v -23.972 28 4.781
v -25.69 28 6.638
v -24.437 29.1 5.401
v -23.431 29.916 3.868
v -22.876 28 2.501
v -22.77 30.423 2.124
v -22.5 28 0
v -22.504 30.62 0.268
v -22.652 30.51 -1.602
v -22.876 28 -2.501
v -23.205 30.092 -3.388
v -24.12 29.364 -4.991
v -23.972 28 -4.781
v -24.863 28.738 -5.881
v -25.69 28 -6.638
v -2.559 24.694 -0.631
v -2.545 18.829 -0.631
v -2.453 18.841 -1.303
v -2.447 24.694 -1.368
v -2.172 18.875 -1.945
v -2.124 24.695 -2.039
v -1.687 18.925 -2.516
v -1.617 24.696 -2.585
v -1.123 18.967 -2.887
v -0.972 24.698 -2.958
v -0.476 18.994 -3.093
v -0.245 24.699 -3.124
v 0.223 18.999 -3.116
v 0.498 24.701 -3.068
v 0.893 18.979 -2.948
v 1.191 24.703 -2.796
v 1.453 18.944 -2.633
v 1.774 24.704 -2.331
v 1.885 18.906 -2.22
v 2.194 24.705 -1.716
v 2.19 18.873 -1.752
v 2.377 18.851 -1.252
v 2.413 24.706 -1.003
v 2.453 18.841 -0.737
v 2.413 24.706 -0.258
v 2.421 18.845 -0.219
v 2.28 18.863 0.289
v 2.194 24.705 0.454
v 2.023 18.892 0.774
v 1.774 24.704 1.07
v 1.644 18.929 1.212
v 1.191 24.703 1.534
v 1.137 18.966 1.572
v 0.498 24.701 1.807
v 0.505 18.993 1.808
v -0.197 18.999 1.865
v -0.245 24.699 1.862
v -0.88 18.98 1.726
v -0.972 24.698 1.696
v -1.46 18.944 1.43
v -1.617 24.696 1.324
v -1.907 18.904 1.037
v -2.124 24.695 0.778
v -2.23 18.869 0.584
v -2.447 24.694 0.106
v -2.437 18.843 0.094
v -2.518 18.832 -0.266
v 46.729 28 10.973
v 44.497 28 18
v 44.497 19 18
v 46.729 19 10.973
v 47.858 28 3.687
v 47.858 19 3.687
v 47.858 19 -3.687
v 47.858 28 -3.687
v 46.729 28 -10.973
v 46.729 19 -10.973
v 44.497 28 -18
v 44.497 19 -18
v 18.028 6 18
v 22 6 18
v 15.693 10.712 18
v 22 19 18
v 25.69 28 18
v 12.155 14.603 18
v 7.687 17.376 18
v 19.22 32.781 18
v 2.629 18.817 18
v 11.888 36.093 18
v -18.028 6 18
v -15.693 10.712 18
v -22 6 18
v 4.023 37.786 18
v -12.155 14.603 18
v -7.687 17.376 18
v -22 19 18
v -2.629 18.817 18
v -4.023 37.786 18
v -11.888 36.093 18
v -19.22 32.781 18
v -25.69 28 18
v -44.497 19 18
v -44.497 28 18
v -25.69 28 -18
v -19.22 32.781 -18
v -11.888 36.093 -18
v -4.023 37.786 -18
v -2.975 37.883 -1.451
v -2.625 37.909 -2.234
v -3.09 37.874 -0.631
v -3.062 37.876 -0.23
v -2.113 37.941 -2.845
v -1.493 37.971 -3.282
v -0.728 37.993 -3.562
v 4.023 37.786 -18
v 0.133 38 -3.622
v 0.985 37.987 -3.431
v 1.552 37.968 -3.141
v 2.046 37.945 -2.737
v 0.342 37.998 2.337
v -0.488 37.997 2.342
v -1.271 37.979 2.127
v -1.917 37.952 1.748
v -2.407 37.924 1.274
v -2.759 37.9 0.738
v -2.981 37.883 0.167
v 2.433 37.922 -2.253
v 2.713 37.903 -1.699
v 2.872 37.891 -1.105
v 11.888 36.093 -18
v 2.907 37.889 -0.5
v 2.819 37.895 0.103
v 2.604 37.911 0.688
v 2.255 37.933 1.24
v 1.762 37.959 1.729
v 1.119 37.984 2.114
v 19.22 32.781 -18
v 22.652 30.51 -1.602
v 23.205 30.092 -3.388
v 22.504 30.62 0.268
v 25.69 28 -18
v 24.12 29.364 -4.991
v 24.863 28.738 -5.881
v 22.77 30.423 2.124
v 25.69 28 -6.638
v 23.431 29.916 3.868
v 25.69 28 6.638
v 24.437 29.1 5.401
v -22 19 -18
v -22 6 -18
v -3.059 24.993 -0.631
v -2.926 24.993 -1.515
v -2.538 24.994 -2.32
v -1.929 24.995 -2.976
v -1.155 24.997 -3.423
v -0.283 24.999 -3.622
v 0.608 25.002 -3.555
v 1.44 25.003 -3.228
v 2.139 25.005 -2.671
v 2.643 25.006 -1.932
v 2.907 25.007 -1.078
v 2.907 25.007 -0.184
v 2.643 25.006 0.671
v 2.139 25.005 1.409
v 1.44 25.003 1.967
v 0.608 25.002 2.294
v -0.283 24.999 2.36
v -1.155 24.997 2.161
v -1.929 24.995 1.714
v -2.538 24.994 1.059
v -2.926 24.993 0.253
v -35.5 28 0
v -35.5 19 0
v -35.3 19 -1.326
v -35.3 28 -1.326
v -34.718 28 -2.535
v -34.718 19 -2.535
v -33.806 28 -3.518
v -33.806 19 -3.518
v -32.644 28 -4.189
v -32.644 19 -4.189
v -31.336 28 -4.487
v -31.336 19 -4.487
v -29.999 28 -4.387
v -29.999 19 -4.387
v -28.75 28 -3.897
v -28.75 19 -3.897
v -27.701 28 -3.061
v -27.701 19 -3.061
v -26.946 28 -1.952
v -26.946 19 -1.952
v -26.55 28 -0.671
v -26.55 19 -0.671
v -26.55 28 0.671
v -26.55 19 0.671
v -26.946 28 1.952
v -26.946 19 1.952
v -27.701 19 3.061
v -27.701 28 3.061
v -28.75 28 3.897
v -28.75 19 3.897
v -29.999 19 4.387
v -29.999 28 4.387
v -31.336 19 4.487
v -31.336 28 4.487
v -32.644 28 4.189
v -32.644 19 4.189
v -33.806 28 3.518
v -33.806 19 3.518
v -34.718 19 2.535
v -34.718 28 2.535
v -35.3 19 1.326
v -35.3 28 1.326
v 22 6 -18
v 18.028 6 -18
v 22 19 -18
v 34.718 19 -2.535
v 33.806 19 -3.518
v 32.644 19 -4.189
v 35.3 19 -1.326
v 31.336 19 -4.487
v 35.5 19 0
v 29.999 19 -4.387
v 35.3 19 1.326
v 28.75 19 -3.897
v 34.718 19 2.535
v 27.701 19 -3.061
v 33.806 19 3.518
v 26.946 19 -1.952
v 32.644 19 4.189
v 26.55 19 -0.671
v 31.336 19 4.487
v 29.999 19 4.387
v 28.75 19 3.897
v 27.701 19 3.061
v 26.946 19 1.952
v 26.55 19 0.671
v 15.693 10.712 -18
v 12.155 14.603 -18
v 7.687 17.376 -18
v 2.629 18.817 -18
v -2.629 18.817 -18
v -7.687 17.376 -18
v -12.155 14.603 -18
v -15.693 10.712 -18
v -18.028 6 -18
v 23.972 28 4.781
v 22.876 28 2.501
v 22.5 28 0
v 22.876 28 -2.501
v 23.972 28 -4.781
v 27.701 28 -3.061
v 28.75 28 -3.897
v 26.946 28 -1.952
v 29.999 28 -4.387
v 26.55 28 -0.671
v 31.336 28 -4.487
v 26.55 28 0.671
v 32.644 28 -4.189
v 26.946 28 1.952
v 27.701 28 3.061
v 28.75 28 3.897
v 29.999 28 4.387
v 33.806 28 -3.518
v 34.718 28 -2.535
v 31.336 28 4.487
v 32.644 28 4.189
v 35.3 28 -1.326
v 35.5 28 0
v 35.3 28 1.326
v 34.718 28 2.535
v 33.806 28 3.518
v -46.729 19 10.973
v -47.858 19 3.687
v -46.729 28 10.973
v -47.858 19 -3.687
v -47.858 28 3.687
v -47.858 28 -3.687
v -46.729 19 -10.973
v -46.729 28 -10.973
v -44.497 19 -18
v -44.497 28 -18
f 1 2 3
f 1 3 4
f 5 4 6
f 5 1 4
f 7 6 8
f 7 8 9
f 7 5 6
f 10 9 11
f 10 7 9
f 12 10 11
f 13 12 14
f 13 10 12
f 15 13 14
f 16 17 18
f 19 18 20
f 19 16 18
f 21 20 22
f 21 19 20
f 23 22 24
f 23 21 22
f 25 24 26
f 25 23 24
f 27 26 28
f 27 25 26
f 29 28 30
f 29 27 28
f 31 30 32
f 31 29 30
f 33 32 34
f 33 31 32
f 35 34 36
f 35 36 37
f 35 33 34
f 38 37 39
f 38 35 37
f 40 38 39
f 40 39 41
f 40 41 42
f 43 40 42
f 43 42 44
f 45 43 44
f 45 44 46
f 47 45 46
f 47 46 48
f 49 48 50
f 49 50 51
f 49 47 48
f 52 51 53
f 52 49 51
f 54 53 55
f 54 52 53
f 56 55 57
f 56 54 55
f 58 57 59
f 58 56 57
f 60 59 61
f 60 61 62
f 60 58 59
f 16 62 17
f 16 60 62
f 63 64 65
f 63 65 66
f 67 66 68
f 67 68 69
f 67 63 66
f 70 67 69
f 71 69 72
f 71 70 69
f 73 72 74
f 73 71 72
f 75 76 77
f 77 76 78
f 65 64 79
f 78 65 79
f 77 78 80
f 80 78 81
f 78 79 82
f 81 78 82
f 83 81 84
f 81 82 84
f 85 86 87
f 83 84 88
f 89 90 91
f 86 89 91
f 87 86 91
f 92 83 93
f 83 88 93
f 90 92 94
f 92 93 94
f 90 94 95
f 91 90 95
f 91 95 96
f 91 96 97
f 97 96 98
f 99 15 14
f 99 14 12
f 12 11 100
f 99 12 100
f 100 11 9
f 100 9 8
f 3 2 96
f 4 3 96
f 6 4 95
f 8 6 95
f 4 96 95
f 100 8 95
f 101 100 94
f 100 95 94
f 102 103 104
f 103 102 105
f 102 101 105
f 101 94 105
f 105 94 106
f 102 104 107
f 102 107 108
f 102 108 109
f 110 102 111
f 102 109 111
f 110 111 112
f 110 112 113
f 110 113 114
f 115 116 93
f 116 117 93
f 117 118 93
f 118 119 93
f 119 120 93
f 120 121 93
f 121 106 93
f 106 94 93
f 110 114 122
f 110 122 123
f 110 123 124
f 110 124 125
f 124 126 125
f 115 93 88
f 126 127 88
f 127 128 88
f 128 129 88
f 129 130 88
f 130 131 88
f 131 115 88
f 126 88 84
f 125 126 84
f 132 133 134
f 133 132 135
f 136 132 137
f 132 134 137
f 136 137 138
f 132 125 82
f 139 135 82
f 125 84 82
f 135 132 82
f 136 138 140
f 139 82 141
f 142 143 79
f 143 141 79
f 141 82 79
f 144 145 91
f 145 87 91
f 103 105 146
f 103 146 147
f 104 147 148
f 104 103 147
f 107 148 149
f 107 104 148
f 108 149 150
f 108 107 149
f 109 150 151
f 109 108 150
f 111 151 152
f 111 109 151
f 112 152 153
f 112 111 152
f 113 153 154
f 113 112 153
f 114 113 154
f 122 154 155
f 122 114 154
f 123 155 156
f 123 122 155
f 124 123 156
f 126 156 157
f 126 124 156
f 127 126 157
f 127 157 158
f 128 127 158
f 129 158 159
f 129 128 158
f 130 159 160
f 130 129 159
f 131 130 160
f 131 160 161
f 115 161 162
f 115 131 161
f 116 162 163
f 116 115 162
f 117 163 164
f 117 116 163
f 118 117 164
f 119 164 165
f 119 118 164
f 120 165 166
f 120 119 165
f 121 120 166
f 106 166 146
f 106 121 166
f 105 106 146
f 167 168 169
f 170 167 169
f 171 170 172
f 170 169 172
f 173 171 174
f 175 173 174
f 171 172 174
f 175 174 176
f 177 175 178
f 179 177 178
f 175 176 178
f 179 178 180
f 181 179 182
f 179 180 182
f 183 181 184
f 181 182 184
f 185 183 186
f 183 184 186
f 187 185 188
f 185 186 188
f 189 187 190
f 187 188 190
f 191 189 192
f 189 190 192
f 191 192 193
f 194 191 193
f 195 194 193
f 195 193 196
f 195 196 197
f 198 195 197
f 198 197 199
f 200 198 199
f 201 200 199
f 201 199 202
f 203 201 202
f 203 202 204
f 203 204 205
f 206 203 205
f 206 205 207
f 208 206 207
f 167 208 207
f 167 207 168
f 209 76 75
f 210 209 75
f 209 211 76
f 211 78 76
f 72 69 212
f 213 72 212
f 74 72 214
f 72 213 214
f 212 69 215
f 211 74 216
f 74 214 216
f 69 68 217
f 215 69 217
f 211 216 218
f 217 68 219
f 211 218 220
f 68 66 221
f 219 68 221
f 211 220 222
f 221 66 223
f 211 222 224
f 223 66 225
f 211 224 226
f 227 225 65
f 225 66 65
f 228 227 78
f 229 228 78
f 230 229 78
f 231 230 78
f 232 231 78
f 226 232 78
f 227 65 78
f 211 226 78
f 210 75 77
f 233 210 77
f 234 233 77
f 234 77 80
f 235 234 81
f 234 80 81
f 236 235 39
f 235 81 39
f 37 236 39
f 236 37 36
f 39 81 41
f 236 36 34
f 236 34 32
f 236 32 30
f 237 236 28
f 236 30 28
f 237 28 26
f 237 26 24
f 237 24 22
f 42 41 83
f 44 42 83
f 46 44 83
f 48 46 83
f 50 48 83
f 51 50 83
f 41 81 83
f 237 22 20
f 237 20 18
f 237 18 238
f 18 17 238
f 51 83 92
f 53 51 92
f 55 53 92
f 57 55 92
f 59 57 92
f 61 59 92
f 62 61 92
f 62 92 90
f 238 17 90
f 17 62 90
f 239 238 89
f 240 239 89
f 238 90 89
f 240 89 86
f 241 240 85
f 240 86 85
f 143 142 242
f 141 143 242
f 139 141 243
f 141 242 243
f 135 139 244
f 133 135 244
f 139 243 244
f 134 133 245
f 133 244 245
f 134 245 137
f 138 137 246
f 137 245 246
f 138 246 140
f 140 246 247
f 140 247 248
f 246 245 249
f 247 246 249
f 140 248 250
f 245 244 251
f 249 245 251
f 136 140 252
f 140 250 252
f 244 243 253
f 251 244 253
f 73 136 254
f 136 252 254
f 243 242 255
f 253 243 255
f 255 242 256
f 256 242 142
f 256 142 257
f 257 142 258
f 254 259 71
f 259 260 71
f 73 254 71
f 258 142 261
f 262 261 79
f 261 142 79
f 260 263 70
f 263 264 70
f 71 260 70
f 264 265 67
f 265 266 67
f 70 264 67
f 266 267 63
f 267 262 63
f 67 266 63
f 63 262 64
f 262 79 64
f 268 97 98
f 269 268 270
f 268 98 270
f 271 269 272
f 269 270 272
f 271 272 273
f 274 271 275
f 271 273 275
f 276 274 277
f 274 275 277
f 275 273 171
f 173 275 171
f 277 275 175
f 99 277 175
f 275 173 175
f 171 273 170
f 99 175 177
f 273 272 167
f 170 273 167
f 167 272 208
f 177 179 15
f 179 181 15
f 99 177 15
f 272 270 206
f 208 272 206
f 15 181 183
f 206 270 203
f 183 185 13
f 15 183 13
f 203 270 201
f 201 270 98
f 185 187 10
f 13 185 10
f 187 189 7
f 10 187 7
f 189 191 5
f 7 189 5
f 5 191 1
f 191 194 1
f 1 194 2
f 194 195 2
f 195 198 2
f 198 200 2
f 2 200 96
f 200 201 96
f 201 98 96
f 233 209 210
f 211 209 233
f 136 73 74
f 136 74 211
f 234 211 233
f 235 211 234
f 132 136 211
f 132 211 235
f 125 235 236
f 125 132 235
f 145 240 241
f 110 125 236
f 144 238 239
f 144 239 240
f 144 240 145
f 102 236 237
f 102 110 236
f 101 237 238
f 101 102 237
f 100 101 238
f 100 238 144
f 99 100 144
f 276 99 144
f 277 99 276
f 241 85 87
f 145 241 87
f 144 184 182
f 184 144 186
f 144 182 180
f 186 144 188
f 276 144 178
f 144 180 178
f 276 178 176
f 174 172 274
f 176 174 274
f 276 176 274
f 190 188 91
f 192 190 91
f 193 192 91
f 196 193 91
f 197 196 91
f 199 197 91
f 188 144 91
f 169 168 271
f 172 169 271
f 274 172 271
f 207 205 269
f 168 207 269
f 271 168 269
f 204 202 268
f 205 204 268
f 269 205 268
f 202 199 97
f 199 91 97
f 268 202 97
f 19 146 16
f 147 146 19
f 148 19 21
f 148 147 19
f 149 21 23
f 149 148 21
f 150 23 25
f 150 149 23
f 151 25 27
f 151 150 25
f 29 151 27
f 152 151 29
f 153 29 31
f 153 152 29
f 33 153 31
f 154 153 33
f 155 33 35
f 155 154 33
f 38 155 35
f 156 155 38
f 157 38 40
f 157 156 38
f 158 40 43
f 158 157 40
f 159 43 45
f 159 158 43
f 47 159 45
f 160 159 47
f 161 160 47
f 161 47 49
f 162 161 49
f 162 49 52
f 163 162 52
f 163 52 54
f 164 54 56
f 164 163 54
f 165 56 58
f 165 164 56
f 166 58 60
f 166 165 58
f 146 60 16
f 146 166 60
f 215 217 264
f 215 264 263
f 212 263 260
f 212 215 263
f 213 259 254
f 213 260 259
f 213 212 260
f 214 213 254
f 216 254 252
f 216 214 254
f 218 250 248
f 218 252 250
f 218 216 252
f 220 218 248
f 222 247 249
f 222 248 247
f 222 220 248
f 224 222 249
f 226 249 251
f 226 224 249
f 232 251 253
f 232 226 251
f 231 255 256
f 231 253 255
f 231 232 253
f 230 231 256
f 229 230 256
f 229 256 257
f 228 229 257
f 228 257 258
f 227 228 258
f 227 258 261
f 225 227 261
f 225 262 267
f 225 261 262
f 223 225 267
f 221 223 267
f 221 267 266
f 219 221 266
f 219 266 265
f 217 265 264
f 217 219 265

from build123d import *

# Parameters (mm, degrees)
BOSS_EXTRUDE1_DEPTH   = 18
F_8_0MM_DOWEL_HOLE1_D = 9
CUT_EXTRUDE3_DEPTH    = 35
CUT_EXTRUDE4_DEPTH    = 3


with BuildPart() as part:
    # Sketch1 → Boss-Extrude1 (new body, symmetric)
    with BuildSketch(Plane.XY):
        with BuildLine():
            Line((-18.027756377, 6), (-22, 6))
            Line((-22, 6), (-22, 19))
            Line((-22, 19), (-50, 19))
            Line((-50, 19), (-50, 28))
            Line((-50, 28), (-25.690465157, 28))
            ThreePointArc((-25.690465157, 28), (0, 38), (25.690465157, 28))
            Line((25.690465157, 28), (50, 28))
            Line((50, 28), (50, 19))
            Line((50, 19), (22, 19))
            Line((22, 19), (22, 6))
            Line((22, 6), (18.027756377, 6))
            ThreePointArc((18.027756377, 6), (0, 19), (-18.027756377, 6))
        make_face()
    extrude(amount=BOSS_EXTRUDE1_DEPTH, both=True)

    # Ø8.0mm Dowel Hole1 (through all)
    with Locations(Plane(origin=(0, 28, 0), x_dir=(1, 0, 0), z_dir=(0, 1, 0))):
        with Locations((-31, 0)):
            f_8_0mm_dowel_hole1 = Hole(F_8_0MM_DOWEL_HOLE1_D / 2)

    # Sketch6 → Cut-Extrude3 (cut)
    with BuildSketch(Plane(origin=(0, 28, 0), x_dir=(1, 0, 0), z_dir=(0, 1, 0))):
        with BuildLine():
            Line((-44.497190923, 18), (-50, 18))
            Line((-50, 18), (-50, -18))
            Line((-50, -18), (-44.497190923, -18))
            ThreePointArc((-44.497190923, -18), (-48, 0), (-44.497190923, 18))
        make_face()
        with BuildLine():
            Line((44.497190923, 18), (50, 18))
            Line((50, 18), (50, -18))
            Line((50, -18), (44.497190923, -18))
            ThreePointArc((44.497190923, -18), (48, 0), (44.497190923, 18))
        make_face()
    extrude(amount=-CUT_EXTRUDE3_DEPTH, mode=Mode.SUBTRACT)

    # Sketch9 → Cut-Extrude4 (cut)
    with BuildSketch(Plane(origin=(0, 28, 0), x_dir=(1, 0, 0), z_dir=(0, 1, 0))):
        with BuildLine():
            Line((-25.690465157, 6.637683312), (-25.690465157, -6.637683312))
            ThreePointArc((-25.690465157, -6.637683312), (-22.5, 0), (-25.690465157, 6.637683312))
        make_face()
    cut_extrude4 = extrude(amount=CUT_EXTRUDE4_DEPTH, mode=Mode.SUBTRACT)

    # Mirror3: Cut-Extrude4 across plane
    add(cut_extrude4.mirror(Plane(origin=(0, 0, 0), x_dir=(0, 0, 1), z_dir=(1, 0, 0))), mode=Mode.SUBTRACT)

    # Mirror4: Ø8.0mm Dowel Hole1 across plane
    add(f_8_0mm_dowel_hole1.mirror(Plane(origin=(0, 0, 0), x_dir=(0, 0, 1), z_dir=(1, 0, 0))), mode=Mode.SUBTRACT)

    # Sketch10 → CBORE for M5 Hex Head Bolt2 (revolve, cut)
    with BuildSketch(Plane(origin=(-0.090113613, 37.999893152, -0.630795288), x_dir=(-0.999997188, -0.002371411, 0), z_dir=(0, 0, 1))):
        Polygon((0, 0), (0, 32.113844592), (2.5, 32.113844592), (2.5, 13.300129879), (2.9995, 13), (3, 0), align=None)
    revolve(axis=Axis((-0.105172072, 44.349875297, -0.630795288), (0.002371411, -0.999997188, 0)), mode=Mode.SUBTRACT)


solid = part.part
